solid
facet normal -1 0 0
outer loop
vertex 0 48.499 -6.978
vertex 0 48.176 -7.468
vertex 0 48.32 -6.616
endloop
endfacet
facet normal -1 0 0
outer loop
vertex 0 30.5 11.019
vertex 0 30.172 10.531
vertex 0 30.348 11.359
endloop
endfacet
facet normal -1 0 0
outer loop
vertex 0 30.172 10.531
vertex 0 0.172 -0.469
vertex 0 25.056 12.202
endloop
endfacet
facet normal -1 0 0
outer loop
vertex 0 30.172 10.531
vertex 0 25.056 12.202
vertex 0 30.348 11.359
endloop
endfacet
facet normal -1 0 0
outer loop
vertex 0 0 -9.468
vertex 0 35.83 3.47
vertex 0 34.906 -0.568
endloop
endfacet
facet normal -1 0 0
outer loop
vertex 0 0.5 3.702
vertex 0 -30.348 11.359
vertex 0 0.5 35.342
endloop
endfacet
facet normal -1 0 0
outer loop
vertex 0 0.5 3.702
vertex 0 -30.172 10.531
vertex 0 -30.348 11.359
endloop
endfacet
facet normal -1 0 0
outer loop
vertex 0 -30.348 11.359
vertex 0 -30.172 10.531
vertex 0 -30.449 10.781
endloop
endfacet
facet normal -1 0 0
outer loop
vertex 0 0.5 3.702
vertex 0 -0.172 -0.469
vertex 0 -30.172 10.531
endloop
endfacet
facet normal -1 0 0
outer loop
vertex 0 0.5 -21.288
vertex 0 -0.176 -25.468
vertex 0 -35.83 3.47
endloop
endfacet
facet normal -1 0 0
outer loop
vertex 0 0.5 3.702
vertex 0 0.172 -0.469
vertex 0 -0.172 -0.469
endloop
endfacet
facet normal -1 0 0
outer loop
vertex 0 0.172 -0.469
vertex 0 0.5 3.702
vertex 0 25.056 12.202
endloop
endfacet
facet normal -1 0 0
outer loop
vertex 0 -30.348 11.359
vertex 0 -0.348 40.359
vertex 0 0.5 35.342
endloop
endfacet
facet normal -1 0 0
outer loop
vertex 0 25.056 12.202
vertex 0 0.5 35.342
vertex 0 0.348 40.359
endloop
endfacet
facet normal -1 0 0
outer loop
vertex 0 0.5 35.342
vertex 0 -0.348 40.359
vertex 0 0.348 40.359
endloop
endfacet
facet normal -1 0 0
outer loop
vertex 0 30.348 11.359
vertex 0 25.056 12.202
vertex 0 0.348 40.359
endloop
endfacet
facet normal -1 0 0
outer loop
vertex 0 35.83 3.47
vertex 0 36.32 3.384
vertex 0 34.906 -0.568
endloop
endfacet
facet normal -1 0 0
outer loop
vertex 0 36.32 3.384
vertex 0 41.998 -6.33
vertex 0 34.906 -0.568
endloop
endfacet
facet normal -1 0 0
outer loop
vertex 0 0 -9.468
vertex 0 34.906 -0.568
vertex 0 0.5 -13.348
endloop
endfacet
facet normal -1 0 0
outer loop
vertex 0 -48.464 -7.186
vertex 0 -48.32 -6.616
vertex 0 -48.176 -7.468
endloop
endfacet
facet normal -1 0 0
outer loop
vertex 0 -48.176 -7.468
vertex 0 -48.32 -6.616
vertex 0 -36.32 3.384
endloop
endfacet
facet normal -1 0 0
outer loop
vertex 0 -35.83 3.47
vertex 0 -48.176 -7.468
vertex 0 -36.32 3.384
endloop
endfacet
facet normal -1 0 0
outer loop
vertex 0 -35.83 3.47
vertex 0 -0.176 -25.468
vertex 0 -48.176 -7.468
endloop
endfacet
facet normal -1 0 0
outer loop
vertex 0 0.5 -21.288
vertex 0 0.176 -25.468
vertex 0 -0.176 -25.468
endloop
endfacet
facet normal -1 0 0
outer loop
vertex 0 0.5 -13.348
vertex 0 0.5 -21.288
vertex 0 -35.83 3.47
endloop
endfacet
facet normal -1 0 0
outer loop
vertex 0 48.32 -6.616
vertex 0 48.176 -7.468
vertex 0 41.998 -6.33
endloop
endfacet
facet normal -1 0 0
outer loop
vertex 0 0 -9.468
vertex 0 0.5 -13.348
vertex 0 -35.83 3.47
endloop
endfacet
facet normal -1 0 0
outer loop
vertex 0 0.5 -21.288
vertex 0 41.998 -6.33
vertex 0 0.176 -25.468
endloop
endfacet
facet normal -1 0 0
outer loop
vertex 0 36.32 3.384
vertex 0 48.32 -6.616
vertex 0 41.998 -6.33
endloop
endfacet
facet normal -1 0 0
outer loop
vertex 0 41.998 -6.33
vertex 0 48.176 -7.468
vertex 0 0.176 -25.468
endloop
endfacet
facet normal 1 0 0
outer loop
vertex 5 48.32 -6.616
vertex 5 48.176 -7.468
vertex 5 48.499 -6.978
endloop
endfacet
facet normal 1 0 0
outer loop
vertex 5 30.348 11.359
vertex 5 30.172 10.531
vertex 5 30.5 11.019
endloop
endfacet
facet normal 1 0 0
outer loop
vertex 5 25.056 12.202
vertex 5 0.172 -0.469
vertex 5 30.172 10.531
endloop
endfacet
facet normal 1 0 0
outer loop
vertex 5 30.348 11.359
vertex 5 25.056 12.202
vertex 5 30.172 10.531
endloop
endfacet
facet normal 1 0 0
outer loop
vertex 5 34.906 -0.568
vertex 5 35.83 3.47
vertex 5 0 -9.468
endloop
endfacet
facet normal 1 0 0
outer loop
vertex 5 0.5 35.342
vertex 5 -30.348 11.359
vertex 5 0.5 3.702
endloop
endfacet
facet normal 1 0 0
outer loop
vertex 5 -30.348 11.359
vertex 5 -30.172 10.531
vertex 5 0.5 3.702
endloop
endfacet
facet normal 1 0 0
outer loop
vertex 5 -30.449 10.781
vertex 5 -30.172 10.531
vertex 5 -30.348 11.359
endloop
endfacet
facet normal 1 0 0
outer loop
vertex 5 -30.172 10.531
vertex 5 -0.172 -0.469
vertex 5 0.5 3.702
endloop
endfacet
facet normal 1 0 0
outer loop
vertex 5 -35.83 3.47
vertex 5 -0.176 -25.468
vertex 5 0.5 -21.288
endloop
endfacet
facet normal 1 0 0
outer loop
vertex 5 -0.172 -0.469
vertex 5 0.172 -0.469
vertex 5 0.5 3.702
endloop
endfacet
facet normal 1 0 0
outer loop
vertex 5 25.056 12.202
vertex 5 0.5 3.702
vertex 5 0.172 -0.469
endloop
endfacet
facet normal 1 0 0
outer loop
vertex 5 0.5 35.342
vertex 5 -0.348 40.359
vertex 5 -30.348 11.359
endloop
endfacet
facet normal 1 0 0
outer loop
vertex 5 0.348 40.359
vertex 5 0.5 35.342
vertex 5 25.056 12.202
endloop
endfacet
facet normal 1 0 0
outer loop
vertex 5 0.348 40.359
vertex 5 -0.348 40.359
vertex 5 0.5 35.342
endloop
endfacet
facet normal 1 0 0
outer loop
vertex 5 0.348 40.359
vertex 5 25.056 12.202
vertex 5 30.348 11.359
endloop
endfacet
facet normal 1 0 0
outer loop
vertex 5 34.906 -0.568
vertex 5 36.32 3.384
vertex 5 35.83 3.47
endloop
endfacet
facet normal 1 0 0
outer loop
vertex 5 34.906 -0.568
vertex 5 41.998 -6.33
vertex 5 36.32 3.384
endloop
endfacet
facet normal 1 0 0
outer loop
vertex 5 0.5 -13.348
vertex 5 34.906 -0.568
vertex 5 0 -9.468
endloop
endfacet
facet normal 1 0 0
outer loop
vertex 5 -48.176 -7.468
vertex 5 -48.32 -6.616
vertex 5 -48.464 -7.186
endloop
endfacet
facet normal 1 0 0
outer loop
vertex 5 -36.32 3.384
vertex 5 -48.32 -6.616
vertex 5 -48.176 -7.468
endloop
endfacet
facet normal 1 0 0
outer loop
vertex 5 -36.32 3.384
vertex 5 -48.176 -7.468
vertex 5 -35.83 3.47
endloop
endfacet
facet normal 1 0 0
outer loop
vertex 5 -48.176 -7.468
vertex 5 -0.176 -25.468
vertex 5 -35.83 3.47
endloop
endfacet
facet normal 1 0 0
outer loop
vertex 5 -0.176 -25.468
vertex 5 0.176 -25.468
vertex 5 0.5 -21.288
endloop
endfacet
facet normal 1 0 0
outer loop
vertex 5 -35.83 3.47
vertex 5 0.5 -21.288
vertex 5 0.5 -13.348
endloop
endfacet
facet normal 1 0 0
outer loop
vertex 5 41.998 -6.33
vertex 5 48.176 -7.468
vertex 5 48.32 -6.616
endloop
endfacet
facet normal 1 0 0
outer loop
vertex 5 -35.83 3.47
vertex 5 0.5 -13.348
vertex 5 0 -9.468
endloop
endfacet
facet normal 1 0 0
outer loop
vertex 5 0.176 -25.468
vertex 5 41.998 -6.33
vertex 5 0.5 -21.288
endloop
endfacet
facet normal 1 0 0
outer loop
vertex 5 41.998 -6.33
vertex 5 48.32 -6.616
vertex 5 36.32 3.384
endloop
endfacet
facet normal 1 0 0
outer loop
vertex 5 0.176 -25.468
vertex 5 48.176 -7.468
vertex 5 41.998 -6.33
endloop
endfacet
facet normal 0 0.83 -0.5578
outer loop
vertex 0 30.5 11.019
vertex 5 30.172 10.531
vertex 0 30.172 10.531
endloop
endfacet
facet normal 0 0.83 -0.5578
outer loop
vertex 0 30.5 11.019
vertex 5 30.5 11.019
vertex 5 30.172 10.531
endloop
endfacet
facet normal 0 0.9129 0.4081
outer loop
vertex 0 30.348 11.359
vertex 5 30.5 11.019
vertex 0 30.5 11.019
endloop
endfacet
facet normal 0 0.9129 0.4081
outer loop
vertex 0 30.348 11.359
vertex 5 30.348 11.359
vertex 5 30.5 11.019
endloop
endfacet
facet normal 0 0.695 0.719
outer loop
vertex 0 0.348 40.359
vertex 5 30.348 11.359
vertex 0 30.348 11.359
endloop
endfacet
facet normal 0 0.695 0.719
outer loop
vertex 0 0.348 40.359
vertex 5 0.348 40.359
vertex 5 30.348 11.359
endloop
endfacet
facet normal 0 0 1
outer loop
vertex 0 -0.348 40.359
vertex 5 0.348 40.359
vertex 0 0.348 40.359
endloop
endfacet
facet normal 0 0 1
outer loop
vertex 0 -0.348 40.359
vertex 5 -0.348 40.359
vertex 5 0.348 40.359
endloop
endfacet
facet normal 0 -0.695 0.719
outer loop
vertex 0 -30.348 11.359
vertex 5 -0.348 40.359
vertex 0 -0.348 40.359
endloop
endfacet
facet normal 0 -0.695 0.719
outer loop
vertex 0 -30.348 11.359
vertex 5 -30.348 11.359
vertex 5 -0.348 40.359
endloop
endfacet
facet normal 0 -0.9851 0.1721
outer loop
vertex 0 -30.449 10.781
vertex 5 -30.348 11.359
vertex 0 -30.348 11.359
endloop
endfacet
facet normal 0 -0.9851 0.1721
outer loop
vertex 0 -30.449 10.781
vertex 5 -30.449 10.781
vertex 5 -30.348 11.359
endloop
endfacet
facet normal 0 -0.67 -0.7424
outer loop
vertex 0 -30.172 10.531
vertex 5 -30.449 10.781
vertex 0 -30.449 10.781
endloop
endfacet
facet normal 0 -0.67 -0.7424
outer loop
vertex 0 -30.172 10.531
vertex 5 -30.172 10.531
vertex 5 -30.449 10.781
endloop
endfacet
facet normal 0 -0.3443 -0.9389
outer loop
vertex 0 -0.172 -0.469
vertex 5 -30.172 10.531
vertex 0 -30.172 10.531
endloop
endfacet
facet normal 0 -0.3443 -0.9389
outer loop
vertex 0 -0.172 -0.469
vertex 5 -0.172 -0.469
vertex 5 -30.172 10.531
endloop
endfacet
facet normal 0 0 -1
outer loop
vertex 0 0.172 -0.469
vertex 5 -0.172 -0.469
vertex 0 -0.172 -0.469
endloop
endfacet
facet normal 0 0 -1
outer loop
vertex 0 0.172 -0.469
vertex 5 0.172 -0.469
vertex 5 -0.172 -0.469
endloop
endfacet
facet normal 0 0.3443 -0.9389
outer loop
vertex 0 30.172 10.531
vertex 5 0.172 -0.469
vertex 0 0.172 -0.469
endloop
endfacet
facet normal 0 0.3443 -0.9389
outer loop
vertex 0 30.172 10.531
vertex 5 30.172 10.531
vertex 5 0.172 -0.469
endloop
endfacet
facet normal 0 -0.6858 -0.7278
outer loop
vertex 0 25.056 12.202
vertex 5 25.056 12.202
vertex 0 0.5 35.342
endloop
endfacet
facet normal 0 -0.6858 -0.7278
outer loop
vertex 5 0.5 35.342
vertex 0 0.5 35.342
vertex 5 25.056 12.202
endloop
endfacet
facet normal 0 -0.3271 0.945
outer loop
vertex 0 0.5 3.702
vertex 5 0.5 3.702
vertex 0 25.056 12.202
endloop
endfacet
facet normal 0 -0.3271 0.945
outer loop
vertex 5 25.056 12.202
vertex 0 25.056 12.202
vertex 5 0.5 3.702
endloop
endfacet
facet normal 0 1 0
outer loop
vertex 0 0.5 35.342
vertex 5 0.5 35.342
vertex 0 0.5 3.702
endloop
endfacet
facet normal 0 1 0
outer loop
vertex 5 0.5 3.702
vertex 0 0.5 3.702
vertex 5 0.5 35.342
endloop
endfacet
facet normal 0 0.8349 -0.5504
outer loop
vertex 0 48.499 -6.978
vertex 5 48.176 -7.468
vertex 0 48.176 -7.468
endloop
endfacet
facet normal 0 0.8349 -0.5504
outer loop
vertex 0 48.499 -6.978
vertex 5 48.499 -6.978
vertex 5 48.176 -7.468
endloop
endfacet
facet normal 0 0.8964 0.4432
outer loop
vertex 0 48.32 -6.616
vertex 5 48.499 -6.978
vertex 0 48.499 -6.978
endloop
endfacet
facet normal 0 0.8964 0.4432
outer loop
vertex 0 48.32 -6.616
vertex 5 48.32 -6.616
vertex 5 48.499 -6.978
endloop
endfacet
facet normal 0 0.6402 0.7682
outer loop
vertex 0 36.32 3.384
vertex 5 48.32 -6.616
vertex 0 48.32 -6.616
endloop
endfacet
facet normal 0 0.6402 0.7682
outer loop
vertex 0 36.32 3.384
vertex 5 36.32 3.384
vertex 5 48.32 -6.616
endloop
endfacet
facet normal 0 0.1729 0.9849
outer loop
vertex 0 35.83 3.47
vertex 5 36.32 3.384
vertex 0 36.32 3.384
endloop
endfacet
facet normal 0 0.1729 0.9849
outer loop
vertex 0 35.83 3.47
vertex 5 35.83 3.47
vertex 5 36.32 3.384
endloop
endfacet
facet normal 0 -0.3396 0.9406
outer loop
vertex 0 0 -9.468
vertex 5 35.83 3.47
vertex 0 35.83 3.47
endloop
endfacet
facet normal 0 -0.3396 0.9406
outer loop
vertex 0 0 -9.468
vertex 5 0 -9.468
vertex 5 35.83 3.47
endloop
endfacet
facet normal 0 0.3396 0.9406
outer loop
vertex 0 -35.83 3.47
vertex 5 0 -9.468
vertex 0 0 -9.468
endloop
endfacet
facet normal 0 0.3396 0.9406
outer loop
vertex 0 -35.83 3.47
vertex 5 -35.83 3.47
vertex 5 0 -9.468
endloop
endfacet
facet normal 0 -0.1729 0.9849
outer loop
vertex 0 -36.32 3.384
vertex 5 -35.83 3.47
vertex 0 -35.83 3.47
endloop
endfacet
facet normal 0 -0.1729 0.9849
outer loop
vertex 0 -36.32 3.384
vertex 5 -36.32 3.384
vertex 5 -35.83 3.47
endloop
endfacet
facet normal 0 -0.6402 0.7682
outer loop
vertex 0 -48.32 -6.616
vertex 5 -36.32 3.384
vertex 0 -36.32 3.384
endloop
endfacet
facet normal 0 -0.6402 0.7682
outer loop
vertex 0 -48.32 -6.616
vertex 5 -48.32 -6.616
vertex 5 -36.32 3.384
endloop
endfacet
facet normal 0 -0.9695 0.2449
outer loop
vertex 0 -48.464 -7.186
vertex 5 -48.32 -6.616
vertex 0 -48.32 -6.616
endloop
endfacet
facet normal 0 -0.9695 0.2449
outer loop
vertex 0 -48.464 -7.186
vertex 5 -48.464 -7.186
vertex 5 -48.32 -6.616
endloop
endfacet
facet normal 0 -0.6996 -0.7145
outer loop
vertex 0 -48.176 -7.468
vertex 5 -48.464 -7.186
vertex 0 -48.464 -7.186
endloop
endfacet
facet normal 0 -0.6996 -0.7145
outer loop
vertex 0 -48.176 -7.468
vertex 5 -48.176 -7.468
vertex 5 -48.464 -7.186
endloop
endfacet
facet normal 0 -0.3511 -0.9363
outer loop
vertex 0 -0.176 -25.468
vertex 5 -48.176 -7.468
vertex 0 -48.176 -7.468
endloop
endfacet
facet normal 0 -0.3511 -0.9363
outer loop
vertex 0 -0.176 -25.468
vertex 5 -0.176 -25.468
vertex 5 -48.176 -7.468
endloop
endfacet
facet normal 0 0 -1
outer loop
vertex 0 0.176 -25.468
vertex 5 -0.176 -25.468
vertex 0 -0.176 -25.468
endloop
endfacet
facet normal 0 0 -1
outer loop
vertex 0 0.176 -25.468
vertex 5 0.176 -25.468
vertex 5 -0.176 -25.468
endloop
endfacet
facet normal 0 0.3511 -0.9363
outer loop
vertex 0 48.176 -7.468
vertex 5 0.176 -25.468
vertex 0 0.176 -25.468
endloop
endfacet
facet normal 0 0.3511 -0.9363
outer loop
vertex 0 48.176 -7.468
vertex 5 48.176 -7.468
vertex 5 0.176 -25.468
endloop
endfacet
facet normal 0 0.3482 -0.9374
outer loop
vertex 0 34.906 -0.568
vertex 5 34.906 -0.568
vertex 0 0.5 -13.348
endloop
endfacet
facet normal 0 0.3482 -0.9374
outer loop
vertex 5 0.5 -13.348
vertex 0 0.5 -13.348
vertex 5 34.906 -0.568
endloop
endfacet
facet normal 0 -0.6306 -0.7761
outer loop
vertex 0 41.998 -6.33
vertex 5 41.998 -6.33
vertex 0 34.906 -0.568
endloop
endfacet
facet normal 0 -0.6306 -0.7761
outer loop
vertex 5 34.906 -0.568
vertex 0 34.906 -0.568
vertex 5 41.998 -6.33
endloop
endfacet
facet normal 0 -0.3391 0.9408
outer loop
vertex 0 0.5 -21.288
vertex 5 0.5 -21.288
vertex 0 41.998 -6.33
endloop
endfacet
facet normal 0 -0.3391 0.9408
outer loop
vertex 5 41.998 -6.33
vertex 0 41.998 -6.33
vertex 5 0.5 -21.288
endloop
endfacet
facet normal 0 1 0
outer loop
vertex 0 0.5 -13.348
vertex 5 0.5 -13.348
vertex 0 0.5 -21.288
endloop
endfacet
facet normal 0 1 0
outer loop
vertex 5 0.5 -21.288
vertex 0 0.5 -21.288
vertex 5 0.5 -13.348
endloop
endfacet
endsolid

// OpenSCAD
module amonkhet(height) {
linear_extrude(height=height) offset(r = .5, chamfer = true){

polygon(points=[[0,0], [0,40], [30,11], [-30,11], [0,3], [0,36.5], [26,12]], paths=[[0,2,1,3], [4,5,6]]);

polygon(points=[[0,-10], [36,3], [48, -7], [0,-25], [-48,-7], [-36, 3], [0,-13], [35,0], [43,-6.5], [0,-22]], paths=[[0,1,2,3,4,5], [6,7,8,9]]);
    }
}
rotate([90,0,90])
amonkhet(5);
